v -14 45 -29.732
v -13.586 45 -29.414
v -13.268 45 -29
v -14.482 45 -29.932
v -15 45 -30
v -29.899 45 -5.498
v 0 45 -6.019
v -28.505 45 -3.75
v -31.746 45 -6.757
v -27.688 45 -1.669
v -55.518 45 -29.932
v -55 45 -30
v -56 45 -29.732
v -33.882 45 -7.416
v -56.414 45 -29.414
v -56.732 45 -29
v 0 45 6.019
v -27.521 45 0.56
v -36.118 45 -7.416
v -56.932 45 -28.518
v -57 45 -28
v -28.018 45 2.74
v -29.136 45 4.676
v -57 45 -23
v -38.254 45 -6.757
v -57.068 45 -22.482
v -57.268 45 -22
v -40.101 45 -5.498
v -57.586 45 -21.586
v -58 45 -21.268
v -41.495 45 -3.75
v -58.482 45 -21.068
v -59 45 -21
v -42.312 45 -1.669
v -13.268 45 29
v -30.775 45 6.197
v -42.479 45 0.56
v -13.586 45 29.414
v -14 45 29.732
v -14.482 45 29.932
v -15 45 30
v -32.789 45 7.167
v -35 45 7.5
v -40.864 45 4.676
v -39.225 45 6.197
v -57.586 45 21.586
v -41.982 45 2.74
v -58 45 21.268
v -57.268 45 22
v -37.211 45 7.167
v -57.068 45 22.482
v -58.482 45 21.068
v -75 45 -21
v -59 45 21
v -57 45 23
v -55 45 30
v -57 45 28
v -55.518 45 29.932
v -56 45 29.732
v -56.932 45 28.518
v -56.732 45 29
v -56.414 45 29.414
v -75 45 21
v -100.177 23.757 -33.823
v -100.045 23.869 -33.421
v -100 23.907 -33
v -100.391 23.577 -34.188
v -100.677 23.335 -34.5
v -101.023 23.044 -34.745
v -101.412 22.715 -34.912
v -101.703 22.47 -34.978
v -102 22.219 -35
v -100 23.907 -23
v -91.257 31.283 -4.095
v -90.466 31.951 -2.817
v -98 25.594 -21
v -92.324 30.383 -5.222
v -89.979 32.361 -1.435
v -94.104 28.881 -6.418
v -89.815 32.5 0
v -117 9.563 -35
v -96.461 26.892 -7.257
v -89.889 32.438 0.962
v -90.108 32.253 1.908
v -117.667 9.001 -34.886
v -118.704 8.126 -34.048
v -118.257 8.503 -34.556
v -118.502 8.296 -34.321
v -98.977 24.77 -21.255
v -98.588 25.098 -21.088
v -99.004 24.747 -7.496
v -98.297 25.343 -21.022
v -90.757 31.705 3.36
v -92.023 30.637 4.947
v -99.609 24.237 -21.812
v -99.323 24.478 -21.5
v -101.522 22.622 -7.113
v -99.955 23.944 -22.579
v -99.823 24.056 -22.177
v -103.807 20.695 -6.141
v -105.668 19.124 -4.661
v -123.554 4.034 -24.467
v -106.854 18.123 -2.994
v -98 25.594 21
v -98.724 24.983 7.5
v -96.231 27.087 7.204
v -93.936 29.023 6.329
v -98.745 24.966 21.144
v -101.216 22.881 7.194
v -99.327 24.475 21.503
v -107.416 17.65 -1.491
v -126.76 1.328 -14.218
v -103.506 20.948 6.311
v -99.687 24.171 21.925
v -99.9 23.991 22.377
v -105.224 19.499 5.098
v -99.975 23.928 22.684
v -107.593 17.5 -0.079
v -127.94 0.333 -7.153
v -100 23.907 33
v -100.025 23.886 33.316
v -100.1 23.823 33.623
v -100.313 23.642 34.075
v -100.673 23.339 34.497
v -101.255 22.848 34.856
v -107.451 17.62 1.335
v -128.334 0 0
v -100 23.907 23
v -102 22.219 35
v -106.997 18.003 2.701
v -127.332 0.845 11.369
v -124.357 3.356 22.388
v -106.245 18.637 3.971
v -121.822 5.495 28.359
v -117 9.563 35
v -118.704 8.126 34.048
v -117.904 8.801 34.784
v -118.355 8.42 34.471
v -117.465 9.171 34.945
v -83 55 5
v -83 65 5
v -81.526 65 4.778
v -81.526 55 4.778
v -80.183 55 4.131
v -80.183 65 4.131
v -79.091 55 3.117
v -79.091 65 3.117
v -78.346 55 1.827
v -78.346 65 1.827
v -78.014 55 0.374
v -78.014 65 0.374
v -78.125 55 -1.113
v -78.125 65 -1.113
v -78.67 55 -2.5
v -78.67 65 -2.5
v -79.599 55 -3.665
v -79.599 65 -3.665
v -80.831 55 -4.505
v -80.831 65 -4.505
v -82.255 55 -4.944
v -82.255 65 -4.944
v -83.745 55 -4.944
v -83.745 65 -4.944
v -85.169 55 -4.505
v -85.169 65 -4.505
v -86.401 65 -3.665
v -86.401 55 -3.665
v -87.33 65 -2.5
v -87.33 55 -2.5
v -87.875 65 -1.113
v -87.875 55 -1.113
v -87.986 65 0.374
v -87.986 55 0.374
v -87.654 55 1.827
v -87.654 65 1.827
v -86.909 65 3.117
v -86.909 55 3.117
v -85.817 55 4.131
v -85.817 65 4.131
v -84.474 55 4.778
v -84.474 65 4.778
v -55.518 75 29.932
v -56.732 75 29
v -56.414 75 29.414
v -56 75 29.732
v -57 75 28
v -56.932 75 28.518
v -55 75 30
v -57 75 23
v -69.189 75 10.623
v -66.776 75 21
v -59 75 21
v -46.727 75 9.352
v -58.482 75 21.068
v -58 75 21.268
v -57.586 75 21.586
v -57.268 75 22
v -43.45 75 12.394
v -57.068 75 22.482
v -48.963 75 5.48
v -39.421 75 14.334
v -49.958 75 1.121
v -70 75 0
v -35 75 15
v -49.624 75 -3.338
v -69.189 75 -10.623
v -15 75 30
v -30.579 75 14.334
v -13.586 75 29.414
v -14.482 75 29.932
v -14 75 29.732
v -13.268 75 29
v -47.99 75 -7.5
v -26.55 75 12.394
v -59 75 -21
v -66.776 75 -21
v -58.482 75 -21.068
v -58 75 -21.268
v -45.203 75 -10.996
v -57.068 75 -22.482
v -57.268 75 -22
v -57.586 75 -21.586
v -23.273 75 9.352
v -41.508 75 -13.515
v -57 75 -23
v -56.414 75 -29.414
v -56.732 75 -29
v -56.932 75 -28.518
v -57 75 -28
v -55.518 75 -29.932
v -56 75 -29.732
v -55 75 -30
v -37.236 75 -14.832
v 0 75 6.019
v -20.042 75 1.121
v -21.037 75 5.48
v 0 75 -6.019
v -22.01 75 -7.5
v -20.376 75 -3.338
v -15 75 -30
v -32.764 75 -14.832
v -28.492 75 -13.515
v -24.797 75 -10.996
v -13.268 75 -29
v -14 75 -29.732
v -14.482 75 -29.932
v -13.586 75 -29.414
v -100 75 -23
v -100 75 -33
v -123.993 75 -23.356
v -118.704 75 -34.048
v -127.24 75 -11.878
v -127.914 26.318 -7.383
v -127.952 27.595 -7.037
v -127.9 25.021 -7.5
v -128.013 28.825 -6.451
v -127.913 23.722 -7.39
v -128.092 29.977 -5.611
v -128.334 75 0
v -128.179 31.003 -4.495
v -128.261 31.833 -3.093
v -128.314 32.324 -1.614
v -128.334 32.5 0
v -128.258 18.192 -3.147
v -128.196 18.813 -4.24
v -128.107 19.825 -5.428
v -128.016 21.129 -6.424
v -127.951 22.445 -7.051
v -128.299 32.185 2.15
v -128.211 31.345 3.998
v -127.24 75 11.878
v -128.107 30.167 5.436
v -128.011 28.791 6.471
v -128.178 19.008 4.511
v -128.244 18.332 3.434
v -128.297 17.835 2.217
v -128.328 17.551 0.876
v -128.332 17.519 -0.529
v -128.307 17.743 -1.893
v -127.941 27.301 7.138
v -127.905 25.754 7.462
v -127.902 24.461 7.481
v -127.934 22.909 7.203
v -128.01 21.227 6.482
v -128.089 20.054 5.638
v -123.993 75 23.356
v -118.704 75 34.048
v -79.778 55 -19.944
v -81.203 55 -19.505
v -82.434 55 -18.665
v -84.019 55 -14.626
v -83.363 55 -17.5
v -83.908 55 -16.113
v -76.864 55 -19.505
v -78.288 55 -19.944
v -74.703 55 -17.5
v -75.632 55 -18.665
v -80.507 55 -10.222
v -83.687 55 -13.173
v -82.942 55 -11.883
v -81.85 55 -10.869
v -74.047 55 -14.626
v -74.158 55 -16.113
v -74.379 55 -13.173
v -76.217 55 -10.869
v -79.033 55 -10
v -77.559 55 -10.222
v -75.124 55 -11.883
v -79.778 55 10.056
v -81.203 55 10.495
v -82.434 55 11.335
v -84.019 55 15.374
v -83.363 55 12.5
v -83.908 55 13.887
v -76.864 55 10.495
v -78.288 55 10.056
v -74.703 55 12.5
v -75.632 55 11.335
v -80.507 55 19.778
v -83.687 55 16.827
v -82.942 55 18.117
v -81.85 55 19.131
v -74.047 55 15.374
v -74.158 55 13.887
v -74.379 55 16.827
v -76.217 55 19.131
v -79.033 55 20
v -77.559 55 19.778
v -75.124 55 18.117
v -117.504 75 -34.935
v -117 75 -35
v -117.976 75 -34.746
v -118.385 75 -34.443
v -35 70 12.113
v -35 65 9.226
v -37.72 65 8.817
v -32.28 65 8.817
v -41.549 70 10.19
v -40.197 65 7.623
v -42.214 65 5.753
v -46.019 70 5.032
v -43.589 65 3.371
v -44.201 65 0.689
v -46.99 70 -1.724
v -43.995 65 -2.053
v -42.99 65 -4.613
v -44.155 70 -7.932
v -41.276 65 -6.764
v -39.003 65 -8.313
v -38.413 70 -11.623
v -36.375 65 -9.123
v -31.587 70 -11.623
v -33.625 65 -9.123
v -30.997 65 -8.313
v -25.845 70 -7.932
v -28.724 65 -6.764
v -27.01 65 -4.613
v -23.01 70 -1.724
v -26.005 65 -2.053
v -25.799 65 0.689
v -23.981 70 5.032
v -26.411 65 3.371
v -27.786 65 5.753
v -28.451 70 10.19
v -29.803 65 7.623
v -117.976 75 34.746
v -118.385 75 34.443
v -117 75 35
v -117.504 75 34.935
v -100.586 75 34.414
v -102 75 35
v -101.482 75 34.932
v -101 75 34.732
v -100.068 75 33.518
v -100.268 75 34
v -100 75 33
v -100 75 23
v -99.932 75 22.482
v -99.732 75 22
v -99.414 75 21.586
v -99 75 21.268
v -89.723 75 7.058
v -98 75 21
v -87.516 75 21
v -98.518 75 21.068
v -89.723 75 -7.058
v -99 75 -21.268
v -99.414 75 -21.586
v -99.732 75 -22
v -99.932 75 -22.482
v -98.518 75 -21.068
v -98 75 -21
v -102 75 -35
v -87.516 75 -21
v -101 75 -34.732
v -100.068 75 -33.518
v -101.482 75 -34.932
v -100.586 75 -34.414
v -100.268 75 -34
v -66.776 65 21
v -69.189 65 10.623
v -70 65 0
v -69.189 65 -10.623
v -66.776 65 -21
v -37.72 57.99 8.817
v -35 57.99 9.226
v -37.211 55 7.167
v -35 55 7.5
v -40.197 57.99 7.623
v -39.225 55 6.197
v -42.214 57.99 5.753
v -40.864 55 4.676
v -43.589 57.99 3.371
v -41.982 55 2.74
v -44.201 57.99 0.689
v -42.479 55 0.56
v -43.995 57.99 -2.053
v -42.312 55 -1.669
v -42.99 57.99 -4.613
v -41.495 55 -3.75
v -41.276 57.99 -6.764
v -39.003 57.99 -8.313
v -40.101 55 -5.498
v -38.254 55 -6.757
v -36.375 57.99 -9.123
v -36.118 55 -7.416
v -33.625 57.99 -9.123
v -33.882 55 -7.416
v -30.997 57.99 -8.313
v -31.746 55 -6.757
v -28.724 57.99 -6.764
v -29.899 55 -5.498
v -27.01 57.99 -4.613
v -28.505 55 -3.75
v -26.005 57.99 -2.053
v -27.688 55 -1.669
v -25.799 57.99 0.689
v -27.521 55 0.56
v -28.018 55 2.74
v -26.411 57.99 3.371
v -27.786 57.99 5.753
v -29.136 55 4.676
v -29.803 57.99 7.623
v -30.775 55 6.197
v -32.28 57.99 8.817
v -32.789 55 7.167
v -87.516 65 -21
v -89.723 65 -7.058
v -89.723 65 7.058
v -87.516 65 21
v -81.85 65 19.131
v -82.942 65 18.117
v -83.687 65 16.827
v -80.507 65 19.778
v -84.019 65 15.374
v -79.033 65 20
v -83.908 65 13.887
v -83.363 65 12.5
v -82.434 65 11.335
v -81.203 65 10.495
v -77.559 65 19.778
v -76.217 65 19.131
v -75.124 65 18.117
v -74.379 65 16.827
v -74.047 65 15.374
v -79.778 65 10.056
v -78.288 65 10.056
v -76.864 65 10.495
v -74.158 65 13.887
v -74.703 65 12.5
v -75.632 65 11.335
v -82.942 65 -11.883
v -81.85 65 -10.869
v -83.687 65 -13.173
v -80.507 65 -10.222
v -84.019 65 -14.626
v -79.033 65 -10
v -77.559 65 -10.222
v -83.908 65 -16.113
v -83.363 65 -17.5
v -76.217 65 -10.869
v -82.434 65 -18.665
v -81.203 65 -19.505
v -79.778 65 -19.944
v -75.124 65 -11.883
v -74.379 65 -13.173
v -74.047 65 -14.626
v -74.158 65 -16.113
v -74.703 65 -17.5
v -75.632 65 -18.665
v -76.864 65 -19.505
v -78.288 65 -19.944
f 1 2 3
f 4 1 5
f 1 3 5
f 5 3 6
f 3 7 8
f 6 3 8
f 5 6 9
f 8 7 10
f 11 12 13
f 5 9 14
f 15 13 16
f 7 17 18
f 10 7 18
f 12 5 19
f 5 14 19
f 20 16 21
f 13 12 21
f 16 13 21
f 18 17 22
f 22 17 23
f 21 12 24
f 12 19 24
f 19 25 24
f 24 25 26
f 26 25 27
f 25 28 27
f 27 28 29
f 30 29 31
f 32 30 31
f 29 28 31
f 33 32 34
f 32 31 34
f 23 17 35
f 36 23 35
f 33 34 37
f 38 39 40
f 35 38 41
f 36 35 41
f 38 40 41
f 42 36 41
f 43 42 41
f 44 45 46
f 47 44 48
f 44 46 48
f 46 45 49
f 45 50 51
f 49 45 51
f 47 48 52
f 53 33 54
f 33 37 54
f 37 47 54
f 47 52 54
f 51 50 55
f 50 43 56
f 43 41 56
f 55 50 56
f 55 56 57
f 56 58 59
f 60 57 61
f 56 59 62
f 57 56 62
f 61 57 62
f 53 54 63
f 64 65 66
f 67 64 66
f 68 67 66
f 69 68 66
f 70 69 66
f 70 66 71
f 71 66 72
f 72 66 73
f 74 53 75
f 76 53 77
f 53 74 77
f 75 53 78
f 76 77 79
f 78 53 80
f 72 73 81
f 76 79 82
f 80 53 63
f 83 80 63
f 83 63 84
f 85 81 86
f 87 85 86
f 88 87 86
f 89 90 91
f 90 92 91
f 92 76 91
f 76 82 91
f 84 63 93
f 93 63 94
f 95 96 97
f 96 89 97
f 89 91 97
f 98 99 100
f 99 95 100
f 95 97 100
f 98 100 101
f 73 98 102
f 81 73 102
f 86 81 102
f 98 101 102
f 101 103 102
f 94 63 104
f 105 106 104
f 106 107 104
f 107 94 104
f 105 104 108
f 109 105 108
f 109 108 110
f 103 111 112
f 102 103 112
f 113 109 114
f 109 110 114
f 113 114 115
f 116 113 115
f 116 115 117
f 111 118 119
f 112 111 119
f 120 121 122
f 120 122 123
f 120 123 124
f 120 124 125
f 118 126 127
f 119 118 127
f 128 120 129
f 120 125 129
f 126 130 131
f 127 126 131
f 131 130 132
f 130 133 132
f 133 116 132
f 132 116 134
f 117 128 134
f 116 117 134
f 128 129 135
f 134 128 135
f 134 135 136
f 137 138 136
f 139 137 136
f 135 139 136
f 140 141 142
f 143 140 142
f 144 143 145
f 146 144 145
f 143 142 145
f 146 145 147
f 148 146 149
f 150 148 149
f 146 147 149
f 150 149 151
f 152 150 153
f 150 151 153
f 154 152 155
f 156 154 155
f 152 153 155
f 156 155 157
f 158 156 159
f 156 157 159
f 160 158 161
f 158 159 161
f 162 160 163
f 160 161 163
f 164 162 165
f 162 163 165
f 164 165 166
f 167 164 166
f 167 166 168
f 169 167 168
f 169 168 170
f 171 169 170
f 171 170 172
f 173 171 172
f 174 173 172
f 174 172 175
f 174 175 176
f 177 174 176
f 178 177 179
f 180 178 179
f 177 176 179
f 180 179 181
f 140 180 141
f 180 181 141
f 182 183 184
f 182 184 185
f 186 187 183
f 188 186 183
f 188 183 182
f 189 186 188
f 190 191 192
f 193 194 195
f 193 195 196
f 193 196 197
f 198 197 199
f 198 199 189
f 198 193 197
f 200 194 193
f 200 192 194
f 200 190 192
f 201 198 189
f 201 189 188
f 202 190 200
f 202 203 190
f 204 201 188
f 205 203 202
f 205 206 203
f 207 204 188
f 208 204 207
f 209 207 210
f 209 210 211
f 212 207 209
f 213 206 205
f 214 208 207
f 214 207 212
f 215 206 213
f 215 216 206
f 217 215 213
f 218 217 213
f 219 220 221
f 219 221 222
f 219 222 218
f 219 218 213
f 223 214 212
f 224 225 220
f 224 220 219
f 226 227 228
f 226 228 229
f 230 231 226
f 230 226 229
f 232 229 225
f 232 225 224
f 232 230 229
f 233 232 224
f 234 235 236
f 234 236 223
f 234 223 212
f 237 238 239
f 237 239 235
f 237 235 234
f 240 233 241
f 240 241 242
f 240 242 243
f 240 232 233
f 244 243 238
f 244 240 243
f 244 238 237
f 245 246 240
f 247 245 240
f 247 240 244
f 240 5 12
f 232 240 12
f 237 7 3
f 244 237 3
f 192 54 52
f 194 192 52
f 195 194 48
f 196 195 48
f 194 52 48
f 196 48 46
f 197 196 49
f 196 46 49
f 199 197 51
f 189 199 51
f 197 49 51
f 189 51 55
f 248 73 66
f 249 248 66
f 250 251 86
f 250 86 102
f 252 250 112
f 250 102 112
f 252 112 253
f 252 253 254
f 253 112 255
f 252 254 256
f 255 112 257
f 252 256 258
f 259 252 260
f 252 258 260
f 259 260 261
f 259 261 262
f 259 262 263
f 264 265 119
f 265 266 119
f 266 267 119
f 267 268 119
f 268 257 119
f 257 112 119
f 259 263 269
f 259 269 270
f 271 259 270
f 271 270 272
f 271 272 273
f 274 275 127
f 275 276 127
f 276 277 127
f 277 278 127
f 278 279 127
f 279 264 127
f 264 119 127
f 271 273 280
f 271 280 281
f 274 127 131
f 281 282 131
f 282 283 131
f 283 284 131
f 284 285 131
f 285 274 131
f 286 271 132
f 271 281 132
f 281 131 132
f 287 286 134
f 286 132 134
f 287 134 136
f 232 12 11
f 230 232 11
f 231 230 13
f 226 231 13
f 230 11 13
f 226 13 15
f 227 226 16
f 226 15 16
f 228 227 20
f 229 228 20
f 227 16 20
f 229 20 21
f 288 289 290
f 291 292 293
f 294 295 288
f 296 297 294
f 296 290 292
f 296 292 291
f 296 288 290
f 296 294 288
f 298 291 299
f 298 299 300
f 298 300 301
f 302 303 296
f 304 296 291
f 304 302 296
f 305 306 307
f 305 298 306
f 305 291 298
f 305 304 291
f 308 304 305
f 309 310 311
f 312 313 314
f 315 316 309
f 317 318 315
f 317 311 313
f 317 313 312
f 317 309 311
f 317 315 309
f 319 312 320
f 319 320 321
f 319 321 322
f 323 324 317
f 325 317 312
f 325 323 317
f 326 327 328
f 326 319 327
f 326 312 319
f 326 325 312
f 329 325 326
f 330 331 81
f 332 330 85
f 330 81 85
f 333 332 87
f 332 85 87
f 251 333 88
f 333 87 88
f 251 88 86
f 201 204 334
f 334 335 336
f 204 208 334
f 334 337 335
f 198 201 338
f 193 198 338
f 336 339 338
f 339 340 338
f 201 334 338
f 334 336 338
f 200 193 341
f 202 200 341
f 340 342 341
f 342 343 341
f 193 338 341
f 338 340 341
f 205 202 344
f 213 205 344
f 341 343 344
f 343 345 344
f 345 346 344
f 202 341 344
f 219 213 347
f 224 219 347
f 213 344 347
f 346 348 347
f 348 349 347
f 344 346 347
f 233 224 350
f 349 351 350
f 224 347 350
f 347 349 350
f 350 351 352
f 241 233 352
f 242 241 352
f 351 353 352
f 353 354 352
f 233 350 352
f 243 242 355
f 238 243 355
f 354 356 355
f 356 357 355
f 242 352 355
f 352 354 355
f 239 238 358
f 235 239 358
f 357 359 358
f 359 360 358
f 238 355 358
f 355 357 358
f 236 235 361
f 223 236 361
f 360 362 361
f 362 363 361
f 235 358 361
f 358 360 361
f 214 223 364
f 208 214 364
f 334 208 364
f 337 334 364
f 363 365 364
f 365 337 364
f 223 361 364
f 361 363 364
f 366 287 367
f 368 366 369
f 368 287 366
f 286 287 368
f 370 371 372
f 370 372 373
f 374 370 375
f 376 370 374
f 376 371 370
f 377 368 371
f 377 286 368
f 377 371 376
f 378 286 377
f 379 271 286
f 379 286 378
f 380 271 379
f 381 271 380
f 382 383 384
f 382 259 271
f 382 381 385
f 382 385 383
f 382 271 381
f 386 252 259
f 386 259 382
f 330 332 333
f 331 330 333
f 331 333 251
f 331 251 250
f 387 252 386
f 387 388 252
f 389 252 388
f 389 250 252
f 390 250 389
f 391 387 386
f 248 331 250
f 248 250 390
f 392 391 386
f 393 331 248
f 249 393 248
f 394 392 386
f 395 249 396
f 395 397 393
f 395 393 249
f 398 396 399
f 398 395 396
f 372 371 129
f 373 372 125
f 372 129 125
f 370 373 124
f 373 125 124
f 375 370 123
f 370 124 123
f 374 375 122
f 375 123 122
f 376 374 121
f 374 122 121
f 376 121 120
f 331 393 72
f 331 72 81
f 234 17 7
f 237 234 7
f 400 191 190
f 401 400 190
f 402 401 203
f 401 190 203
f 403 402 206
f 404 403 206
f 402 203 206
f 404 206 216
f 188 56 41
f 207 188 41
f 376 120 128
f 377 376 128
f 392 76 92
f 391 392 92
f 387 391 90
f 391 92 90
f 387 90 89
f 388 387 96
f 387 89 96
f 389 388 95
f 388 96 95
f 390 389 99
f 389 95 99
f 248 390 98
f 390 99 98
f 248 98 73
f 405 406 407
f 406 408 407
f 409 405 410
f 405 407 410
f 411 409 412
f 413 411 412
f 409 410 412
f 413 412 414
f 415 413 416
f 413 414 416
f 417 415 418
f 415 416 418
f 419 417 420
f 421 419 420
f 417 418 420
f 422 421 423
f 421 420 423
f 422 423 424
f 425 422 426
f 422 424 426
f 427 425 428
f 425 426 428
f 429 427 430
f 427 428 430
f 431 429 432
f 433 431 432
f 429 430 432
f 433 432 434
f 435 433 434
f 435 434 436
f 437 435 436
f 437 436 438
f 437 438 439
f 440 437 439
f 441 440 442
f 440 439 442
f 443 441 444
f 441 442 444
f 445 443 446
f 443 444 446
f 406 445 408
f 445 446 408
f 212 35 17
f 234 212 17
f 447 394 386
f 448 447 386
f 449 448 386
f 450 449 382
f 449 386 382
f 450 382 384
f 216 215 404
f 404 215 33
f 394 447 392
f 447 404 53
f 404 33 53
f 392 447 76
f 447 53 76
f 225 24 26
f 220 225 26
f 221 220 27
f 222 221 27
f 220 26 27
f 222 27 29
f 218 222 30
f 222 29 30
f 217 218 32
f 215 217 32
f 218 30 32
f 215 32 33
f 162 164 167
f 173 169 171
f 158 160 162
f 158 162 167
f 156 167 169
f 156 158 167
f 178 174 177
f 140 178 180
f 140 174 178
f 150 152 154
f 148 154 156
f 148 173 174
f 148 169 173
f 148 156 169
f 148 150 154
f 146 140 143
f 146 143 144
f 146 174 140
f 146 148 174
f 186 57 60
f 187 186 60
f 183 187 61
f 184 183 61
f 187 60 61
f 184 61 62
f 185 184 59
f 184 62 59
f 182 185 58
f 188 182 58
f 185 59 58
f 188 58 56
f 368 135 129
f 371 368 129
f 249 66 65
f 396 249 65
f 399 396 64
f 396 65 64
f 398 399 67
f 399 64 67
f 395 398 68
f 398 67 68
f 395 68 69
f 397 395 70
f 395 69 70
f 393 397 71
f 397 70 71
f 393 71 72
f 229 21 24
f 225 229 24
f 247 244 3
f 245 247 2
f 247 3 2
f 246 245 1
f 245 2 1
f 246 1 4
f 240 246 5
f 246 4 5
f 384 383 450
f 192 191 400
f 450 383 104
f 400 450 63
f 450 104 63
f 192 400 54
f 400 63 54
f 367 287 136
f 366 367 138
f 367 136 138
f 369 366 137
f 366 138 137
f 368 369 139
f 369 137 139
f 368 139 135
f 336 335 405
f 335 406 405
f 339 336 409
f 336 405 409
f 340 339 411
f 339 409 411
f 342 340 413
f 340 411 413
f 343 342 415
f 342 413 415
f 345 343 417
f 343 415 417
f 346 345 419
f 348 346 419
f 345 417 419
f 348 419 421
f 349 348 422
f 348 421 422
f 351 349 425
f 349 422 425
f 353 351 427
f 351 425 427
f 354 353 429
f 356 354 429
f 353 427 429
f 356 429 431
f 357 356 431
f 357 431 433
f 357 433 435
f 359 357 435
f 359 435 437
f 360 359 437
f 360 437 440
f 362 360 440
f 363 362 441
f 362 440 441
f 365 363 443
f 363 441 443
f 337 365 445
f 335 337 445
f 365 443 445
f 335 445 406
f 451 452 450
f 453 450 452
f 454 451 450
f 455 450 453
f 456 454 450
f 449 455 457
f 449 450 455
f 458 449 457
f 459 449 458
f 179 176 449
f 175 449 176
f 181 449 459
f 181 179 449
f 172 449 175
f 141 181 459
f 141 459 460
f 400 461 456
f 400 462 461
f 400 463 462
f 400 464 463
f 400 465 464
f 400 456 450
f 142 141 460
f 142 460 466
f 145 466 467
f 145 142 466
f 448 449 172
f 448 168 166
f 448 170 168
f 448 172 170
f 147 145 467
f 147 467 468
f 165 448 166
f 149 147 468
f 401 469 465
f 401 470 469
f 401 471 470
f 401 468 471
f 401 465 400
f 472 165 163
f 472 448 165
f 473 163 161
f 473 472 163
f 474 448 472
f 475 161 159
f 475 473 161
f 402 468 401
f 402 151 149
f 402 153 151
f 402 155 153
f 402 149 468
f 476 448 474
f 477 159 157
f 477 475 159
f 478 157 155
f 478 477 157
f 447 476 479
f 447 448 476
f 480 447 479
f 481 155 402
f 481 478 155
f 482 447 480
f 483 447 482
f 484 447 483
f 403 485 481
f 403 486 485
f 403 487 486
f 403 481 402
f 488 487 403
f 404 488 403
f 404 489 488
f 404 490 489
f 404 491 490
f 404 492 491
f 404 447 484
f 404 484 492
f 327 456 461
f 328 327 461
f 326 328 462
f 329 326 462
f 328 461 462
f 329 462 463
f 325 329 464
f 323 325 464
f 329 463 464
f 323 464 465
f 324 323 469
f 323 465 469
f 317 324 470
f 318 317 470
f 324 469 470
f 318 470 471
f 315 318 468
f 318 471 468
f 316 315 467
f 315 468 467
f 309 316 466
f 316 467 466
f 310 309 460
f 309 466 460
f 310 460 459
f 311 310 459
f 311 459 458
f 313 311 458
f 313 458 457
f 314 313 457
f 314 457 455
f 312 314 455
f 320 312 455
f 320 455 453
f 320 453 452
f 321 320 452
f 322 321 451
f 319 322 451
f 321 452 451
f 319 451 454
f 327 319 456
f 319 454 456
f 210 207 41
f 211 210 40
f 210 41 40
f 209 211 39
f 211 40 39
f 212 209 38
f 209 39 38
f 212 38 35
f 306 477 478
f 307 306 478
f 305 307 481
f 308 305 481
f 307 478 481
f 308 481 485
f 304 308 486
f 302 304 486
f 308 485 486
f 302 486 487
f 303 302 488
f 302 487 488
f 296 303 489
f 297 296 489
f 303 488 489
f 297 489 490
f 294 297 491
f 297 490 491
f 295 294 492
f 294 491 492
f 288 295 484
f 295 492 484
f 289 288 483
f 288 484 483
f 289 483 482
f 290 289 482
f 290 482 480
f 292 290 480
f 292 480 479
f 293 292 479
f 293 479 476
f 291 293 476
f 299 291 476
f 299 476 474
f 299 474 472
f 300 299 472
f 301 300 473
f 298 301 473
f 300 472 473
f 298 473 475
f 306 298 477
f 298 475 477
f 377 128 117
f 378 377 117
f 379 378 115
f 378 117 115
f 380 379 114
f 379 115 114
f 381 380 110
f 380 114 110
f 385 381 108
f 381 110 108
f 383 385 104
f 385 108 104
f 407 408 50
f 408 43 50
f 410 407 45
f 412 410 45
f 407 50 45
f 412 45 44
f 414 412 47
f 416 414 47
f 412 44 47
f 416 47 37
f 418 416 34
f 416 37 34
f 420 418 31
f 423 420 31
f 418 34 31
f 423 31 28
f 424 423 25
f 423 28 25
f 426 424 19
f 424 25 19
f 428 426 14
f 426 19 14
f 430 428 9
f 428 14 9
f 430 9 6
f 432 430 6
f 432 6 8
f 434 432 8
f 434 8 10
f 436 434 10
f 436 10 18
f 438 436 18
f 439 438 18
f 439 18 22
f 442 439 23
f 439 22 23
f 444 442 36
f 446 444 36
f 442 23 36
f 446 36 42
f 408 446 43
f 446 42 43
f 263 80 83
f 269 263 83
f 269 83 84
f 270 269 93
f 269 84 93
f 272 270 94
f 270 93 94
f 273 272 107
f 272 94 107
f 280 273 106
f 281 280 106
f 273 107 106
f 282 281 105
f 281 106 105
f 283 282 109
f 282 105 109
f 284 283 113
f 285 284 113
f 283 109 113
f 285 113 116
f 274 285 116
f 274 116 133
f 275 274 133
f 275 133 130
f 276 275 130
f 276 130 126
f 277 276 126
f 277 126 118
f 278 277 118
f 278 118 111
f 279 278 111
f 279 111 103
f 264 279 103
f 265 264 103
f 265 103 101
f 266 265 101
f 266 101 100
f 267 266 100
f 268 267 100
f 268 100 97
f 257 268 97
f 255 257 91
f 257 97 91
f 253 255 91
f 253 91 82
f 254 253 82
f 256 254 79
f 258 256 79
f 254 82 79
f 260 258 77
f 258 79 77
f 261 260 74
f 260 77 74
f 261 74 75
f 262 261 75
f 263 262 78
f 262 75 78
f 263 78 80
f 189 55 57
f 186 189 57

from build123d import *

# Parameters (mm, degrees)
BOSS_EXTRUDE2_DEPTH = 75
CUT_EXTRUDE1_DEPTH  = 50
CUT_EXTRUDE2_DEPTH  = 10
SKETCH7_R           = 5
CUT_EXTRUDE3_DEPTH  = 10
SKETCH8_R           = 7.5
CUT_EXTRUDE4_DEPTH  = 153.707924315


with BuildPart() as part:
    # Sketch3 → Boss-Extrude2 (new body)
    with BuildSketch(Plane(origin=(0, 0, 0), x_dir=(1, 0, 0), z_dir=(0, 1, 0))):
        with BuildLine():
            Line((0, -6.019237886), (0, 6.019237886))
            Line((0, 6.019237886), (-13.267949192, 29))
            ThreePointArc((-13.267949192, 29), (-14, 29.732050808), (-15, 30))
            Line((-15, 30), (-55, 30))
            ThreePointArc((-55, 30), (-56.414213562, 29.414213562), (-57, 28))
            Line((-57, 28), (-57, 23))
            ThreePointArc((-57, 23), (-57.585786438, 21.585786438), (-59, 21))
            Line((-59, 21), (-98, 21))
            ThreePointArc((-98, 21), (-99.414213562, 21.585786438), (-100, 23))
            Line((-100, 23), (-100, 33))
            ThreePointArc((-100, 33), (-100.585786438, 34.414213562), (-102, 35))
            Line((-102, 35), (-117, 35))
            ThreePointArc((-117, 35), (-117.975900073, 34.745743122), (-118.70367084, 34.047619048))
            ThreePointArc((-118.70367084, 34.047619048), (-128.33436854, 0), (-118.70367084, -34.047619048))
            ThreePointArc((-118.70367084, -34.047619048), (-117.975900073, -34.745743122), (-117, -35))
            Line((-117, -35), (-102, -35))
            ThreePointArc((-102, -35), (-100.585786438, -34.414213562), (-100, -33))
            Line((-100, -33), (-100, -23))
            ThreePointArc((-100, -23), (-99.414213562, -21.585786438), (-98, -21))
            Line((-98, -21), (-59, -21))
            ThreePointArc((-59, -21), (-57.585786438, -21.585786438), (-57, -23))
            Line((-57, -23), (-57, -28))
            ThreePointArc((-57, -28), (-56.414213562, -29.414213562), (-55, -30))
            Line((-55, -30), (-15, -30))
            ThreePointArc((-15, -30), (-14, -29.732050808), (-13.267949192, -29))
            Line((-13.267949192, -29), (0, -6.019237886))
        make_face()
    extrude(amount=BOSS_EXTRUDE2_DEPTH)

    # Sketch4 → Cut-Extrude1 (cut, symmetric)
    with BuildSketch(Plane.XY):
        Polygon((0, 45), (-75, 45), (-128.33436854, 0), (0, 0), align=None)
    extrude(amount=CUT_EXTRUDE1_DEPTH, both=True, mode=Mode.SUBTRACT)

    # Sketch5 → Cut-Revolve1 (revolve, cut)
    with BuildSketch(Plane.XY, mode=Mode.PRIVATE) as cut_revolve1_sk:
        Polygon((-35, 75), (-50, 75), (-44.226497308, 65), (-44.226497308, 57.990381057), (-42.5, 55), (-42.5, 45), (-35, 45), align=None)
    revolve(cut_revolve1_sk.sketch.rotate(Axis((-35, 75, 0), (0, -1, 0)), 270), axis=Axis((-35, 75, 0), (0, -1, 0)), mode=Mode.SUBTRACT)

    # Sketch6 → Cut-Extrude2 (cut)
    with BuildSketch(Plane(origin=(0, 75, 0), x_dir=(1, 0, 0), z_dir=(0, 1, 0))):
        with BuildLine():
            Line((-55.908593, 42.121600501), (-57.789518761, 68.995445657))
            ThreePointArc((-57.789518761, 68.995445657), (-88.91346012, 13.942618456), (-76.134860141, -47.994615024))
            Line((-76.134860141, -47.994615024), (-58.539070897, -38.381990289))
            ThreePointArc((-58.539070897, -38.381990289), (-69.962661294, 2.286050005), (-55.908593, 42.121600501))
        make_face()
    extrude(amount=-CUT_EXTRUDE2_DEPTH, mode=Mode.SUBTRACT)

    # Sketch7 → Cut-Extrude3 (cut)
    with BuildSketch(Plane(origin=(0, 65, 0), x_dir=(1, 0, 0), z_dir=(0, 1, 0))):
        with Locations(Location((-79.033128747, 15, 0), (0, 0, 270))):
            Circle(SKETCH7_R)
        with Locations(Location((-83, 0, 0), (0, 0, 270))):
            Circle(SKETCH7_R)
        with Locations(Location((-79.033128747, -15, 0), (0, 0, 270))):
            Circle(SKETCH7_R)
    extrude(amount=-CUT_EXTRUDE3_DEPTH, mode=Mode.SUBTRACT)

    # Sketch8 → Cut-Extrude4 (cut, through all)
    with BuildSketch(Plane(origin=(0, 0, 0), x_dir=(0, 0, -1), z_dir=(1, 0, 0))):
        with Locations(Location((0, 25, 0), (0, 0, 90))):
            Circle(SKETCH8_R)
    extrude(amount=-CUT_EXTRUDE4_DEPTH, mode=Mode.SUBTRACT)


solid = part.part
